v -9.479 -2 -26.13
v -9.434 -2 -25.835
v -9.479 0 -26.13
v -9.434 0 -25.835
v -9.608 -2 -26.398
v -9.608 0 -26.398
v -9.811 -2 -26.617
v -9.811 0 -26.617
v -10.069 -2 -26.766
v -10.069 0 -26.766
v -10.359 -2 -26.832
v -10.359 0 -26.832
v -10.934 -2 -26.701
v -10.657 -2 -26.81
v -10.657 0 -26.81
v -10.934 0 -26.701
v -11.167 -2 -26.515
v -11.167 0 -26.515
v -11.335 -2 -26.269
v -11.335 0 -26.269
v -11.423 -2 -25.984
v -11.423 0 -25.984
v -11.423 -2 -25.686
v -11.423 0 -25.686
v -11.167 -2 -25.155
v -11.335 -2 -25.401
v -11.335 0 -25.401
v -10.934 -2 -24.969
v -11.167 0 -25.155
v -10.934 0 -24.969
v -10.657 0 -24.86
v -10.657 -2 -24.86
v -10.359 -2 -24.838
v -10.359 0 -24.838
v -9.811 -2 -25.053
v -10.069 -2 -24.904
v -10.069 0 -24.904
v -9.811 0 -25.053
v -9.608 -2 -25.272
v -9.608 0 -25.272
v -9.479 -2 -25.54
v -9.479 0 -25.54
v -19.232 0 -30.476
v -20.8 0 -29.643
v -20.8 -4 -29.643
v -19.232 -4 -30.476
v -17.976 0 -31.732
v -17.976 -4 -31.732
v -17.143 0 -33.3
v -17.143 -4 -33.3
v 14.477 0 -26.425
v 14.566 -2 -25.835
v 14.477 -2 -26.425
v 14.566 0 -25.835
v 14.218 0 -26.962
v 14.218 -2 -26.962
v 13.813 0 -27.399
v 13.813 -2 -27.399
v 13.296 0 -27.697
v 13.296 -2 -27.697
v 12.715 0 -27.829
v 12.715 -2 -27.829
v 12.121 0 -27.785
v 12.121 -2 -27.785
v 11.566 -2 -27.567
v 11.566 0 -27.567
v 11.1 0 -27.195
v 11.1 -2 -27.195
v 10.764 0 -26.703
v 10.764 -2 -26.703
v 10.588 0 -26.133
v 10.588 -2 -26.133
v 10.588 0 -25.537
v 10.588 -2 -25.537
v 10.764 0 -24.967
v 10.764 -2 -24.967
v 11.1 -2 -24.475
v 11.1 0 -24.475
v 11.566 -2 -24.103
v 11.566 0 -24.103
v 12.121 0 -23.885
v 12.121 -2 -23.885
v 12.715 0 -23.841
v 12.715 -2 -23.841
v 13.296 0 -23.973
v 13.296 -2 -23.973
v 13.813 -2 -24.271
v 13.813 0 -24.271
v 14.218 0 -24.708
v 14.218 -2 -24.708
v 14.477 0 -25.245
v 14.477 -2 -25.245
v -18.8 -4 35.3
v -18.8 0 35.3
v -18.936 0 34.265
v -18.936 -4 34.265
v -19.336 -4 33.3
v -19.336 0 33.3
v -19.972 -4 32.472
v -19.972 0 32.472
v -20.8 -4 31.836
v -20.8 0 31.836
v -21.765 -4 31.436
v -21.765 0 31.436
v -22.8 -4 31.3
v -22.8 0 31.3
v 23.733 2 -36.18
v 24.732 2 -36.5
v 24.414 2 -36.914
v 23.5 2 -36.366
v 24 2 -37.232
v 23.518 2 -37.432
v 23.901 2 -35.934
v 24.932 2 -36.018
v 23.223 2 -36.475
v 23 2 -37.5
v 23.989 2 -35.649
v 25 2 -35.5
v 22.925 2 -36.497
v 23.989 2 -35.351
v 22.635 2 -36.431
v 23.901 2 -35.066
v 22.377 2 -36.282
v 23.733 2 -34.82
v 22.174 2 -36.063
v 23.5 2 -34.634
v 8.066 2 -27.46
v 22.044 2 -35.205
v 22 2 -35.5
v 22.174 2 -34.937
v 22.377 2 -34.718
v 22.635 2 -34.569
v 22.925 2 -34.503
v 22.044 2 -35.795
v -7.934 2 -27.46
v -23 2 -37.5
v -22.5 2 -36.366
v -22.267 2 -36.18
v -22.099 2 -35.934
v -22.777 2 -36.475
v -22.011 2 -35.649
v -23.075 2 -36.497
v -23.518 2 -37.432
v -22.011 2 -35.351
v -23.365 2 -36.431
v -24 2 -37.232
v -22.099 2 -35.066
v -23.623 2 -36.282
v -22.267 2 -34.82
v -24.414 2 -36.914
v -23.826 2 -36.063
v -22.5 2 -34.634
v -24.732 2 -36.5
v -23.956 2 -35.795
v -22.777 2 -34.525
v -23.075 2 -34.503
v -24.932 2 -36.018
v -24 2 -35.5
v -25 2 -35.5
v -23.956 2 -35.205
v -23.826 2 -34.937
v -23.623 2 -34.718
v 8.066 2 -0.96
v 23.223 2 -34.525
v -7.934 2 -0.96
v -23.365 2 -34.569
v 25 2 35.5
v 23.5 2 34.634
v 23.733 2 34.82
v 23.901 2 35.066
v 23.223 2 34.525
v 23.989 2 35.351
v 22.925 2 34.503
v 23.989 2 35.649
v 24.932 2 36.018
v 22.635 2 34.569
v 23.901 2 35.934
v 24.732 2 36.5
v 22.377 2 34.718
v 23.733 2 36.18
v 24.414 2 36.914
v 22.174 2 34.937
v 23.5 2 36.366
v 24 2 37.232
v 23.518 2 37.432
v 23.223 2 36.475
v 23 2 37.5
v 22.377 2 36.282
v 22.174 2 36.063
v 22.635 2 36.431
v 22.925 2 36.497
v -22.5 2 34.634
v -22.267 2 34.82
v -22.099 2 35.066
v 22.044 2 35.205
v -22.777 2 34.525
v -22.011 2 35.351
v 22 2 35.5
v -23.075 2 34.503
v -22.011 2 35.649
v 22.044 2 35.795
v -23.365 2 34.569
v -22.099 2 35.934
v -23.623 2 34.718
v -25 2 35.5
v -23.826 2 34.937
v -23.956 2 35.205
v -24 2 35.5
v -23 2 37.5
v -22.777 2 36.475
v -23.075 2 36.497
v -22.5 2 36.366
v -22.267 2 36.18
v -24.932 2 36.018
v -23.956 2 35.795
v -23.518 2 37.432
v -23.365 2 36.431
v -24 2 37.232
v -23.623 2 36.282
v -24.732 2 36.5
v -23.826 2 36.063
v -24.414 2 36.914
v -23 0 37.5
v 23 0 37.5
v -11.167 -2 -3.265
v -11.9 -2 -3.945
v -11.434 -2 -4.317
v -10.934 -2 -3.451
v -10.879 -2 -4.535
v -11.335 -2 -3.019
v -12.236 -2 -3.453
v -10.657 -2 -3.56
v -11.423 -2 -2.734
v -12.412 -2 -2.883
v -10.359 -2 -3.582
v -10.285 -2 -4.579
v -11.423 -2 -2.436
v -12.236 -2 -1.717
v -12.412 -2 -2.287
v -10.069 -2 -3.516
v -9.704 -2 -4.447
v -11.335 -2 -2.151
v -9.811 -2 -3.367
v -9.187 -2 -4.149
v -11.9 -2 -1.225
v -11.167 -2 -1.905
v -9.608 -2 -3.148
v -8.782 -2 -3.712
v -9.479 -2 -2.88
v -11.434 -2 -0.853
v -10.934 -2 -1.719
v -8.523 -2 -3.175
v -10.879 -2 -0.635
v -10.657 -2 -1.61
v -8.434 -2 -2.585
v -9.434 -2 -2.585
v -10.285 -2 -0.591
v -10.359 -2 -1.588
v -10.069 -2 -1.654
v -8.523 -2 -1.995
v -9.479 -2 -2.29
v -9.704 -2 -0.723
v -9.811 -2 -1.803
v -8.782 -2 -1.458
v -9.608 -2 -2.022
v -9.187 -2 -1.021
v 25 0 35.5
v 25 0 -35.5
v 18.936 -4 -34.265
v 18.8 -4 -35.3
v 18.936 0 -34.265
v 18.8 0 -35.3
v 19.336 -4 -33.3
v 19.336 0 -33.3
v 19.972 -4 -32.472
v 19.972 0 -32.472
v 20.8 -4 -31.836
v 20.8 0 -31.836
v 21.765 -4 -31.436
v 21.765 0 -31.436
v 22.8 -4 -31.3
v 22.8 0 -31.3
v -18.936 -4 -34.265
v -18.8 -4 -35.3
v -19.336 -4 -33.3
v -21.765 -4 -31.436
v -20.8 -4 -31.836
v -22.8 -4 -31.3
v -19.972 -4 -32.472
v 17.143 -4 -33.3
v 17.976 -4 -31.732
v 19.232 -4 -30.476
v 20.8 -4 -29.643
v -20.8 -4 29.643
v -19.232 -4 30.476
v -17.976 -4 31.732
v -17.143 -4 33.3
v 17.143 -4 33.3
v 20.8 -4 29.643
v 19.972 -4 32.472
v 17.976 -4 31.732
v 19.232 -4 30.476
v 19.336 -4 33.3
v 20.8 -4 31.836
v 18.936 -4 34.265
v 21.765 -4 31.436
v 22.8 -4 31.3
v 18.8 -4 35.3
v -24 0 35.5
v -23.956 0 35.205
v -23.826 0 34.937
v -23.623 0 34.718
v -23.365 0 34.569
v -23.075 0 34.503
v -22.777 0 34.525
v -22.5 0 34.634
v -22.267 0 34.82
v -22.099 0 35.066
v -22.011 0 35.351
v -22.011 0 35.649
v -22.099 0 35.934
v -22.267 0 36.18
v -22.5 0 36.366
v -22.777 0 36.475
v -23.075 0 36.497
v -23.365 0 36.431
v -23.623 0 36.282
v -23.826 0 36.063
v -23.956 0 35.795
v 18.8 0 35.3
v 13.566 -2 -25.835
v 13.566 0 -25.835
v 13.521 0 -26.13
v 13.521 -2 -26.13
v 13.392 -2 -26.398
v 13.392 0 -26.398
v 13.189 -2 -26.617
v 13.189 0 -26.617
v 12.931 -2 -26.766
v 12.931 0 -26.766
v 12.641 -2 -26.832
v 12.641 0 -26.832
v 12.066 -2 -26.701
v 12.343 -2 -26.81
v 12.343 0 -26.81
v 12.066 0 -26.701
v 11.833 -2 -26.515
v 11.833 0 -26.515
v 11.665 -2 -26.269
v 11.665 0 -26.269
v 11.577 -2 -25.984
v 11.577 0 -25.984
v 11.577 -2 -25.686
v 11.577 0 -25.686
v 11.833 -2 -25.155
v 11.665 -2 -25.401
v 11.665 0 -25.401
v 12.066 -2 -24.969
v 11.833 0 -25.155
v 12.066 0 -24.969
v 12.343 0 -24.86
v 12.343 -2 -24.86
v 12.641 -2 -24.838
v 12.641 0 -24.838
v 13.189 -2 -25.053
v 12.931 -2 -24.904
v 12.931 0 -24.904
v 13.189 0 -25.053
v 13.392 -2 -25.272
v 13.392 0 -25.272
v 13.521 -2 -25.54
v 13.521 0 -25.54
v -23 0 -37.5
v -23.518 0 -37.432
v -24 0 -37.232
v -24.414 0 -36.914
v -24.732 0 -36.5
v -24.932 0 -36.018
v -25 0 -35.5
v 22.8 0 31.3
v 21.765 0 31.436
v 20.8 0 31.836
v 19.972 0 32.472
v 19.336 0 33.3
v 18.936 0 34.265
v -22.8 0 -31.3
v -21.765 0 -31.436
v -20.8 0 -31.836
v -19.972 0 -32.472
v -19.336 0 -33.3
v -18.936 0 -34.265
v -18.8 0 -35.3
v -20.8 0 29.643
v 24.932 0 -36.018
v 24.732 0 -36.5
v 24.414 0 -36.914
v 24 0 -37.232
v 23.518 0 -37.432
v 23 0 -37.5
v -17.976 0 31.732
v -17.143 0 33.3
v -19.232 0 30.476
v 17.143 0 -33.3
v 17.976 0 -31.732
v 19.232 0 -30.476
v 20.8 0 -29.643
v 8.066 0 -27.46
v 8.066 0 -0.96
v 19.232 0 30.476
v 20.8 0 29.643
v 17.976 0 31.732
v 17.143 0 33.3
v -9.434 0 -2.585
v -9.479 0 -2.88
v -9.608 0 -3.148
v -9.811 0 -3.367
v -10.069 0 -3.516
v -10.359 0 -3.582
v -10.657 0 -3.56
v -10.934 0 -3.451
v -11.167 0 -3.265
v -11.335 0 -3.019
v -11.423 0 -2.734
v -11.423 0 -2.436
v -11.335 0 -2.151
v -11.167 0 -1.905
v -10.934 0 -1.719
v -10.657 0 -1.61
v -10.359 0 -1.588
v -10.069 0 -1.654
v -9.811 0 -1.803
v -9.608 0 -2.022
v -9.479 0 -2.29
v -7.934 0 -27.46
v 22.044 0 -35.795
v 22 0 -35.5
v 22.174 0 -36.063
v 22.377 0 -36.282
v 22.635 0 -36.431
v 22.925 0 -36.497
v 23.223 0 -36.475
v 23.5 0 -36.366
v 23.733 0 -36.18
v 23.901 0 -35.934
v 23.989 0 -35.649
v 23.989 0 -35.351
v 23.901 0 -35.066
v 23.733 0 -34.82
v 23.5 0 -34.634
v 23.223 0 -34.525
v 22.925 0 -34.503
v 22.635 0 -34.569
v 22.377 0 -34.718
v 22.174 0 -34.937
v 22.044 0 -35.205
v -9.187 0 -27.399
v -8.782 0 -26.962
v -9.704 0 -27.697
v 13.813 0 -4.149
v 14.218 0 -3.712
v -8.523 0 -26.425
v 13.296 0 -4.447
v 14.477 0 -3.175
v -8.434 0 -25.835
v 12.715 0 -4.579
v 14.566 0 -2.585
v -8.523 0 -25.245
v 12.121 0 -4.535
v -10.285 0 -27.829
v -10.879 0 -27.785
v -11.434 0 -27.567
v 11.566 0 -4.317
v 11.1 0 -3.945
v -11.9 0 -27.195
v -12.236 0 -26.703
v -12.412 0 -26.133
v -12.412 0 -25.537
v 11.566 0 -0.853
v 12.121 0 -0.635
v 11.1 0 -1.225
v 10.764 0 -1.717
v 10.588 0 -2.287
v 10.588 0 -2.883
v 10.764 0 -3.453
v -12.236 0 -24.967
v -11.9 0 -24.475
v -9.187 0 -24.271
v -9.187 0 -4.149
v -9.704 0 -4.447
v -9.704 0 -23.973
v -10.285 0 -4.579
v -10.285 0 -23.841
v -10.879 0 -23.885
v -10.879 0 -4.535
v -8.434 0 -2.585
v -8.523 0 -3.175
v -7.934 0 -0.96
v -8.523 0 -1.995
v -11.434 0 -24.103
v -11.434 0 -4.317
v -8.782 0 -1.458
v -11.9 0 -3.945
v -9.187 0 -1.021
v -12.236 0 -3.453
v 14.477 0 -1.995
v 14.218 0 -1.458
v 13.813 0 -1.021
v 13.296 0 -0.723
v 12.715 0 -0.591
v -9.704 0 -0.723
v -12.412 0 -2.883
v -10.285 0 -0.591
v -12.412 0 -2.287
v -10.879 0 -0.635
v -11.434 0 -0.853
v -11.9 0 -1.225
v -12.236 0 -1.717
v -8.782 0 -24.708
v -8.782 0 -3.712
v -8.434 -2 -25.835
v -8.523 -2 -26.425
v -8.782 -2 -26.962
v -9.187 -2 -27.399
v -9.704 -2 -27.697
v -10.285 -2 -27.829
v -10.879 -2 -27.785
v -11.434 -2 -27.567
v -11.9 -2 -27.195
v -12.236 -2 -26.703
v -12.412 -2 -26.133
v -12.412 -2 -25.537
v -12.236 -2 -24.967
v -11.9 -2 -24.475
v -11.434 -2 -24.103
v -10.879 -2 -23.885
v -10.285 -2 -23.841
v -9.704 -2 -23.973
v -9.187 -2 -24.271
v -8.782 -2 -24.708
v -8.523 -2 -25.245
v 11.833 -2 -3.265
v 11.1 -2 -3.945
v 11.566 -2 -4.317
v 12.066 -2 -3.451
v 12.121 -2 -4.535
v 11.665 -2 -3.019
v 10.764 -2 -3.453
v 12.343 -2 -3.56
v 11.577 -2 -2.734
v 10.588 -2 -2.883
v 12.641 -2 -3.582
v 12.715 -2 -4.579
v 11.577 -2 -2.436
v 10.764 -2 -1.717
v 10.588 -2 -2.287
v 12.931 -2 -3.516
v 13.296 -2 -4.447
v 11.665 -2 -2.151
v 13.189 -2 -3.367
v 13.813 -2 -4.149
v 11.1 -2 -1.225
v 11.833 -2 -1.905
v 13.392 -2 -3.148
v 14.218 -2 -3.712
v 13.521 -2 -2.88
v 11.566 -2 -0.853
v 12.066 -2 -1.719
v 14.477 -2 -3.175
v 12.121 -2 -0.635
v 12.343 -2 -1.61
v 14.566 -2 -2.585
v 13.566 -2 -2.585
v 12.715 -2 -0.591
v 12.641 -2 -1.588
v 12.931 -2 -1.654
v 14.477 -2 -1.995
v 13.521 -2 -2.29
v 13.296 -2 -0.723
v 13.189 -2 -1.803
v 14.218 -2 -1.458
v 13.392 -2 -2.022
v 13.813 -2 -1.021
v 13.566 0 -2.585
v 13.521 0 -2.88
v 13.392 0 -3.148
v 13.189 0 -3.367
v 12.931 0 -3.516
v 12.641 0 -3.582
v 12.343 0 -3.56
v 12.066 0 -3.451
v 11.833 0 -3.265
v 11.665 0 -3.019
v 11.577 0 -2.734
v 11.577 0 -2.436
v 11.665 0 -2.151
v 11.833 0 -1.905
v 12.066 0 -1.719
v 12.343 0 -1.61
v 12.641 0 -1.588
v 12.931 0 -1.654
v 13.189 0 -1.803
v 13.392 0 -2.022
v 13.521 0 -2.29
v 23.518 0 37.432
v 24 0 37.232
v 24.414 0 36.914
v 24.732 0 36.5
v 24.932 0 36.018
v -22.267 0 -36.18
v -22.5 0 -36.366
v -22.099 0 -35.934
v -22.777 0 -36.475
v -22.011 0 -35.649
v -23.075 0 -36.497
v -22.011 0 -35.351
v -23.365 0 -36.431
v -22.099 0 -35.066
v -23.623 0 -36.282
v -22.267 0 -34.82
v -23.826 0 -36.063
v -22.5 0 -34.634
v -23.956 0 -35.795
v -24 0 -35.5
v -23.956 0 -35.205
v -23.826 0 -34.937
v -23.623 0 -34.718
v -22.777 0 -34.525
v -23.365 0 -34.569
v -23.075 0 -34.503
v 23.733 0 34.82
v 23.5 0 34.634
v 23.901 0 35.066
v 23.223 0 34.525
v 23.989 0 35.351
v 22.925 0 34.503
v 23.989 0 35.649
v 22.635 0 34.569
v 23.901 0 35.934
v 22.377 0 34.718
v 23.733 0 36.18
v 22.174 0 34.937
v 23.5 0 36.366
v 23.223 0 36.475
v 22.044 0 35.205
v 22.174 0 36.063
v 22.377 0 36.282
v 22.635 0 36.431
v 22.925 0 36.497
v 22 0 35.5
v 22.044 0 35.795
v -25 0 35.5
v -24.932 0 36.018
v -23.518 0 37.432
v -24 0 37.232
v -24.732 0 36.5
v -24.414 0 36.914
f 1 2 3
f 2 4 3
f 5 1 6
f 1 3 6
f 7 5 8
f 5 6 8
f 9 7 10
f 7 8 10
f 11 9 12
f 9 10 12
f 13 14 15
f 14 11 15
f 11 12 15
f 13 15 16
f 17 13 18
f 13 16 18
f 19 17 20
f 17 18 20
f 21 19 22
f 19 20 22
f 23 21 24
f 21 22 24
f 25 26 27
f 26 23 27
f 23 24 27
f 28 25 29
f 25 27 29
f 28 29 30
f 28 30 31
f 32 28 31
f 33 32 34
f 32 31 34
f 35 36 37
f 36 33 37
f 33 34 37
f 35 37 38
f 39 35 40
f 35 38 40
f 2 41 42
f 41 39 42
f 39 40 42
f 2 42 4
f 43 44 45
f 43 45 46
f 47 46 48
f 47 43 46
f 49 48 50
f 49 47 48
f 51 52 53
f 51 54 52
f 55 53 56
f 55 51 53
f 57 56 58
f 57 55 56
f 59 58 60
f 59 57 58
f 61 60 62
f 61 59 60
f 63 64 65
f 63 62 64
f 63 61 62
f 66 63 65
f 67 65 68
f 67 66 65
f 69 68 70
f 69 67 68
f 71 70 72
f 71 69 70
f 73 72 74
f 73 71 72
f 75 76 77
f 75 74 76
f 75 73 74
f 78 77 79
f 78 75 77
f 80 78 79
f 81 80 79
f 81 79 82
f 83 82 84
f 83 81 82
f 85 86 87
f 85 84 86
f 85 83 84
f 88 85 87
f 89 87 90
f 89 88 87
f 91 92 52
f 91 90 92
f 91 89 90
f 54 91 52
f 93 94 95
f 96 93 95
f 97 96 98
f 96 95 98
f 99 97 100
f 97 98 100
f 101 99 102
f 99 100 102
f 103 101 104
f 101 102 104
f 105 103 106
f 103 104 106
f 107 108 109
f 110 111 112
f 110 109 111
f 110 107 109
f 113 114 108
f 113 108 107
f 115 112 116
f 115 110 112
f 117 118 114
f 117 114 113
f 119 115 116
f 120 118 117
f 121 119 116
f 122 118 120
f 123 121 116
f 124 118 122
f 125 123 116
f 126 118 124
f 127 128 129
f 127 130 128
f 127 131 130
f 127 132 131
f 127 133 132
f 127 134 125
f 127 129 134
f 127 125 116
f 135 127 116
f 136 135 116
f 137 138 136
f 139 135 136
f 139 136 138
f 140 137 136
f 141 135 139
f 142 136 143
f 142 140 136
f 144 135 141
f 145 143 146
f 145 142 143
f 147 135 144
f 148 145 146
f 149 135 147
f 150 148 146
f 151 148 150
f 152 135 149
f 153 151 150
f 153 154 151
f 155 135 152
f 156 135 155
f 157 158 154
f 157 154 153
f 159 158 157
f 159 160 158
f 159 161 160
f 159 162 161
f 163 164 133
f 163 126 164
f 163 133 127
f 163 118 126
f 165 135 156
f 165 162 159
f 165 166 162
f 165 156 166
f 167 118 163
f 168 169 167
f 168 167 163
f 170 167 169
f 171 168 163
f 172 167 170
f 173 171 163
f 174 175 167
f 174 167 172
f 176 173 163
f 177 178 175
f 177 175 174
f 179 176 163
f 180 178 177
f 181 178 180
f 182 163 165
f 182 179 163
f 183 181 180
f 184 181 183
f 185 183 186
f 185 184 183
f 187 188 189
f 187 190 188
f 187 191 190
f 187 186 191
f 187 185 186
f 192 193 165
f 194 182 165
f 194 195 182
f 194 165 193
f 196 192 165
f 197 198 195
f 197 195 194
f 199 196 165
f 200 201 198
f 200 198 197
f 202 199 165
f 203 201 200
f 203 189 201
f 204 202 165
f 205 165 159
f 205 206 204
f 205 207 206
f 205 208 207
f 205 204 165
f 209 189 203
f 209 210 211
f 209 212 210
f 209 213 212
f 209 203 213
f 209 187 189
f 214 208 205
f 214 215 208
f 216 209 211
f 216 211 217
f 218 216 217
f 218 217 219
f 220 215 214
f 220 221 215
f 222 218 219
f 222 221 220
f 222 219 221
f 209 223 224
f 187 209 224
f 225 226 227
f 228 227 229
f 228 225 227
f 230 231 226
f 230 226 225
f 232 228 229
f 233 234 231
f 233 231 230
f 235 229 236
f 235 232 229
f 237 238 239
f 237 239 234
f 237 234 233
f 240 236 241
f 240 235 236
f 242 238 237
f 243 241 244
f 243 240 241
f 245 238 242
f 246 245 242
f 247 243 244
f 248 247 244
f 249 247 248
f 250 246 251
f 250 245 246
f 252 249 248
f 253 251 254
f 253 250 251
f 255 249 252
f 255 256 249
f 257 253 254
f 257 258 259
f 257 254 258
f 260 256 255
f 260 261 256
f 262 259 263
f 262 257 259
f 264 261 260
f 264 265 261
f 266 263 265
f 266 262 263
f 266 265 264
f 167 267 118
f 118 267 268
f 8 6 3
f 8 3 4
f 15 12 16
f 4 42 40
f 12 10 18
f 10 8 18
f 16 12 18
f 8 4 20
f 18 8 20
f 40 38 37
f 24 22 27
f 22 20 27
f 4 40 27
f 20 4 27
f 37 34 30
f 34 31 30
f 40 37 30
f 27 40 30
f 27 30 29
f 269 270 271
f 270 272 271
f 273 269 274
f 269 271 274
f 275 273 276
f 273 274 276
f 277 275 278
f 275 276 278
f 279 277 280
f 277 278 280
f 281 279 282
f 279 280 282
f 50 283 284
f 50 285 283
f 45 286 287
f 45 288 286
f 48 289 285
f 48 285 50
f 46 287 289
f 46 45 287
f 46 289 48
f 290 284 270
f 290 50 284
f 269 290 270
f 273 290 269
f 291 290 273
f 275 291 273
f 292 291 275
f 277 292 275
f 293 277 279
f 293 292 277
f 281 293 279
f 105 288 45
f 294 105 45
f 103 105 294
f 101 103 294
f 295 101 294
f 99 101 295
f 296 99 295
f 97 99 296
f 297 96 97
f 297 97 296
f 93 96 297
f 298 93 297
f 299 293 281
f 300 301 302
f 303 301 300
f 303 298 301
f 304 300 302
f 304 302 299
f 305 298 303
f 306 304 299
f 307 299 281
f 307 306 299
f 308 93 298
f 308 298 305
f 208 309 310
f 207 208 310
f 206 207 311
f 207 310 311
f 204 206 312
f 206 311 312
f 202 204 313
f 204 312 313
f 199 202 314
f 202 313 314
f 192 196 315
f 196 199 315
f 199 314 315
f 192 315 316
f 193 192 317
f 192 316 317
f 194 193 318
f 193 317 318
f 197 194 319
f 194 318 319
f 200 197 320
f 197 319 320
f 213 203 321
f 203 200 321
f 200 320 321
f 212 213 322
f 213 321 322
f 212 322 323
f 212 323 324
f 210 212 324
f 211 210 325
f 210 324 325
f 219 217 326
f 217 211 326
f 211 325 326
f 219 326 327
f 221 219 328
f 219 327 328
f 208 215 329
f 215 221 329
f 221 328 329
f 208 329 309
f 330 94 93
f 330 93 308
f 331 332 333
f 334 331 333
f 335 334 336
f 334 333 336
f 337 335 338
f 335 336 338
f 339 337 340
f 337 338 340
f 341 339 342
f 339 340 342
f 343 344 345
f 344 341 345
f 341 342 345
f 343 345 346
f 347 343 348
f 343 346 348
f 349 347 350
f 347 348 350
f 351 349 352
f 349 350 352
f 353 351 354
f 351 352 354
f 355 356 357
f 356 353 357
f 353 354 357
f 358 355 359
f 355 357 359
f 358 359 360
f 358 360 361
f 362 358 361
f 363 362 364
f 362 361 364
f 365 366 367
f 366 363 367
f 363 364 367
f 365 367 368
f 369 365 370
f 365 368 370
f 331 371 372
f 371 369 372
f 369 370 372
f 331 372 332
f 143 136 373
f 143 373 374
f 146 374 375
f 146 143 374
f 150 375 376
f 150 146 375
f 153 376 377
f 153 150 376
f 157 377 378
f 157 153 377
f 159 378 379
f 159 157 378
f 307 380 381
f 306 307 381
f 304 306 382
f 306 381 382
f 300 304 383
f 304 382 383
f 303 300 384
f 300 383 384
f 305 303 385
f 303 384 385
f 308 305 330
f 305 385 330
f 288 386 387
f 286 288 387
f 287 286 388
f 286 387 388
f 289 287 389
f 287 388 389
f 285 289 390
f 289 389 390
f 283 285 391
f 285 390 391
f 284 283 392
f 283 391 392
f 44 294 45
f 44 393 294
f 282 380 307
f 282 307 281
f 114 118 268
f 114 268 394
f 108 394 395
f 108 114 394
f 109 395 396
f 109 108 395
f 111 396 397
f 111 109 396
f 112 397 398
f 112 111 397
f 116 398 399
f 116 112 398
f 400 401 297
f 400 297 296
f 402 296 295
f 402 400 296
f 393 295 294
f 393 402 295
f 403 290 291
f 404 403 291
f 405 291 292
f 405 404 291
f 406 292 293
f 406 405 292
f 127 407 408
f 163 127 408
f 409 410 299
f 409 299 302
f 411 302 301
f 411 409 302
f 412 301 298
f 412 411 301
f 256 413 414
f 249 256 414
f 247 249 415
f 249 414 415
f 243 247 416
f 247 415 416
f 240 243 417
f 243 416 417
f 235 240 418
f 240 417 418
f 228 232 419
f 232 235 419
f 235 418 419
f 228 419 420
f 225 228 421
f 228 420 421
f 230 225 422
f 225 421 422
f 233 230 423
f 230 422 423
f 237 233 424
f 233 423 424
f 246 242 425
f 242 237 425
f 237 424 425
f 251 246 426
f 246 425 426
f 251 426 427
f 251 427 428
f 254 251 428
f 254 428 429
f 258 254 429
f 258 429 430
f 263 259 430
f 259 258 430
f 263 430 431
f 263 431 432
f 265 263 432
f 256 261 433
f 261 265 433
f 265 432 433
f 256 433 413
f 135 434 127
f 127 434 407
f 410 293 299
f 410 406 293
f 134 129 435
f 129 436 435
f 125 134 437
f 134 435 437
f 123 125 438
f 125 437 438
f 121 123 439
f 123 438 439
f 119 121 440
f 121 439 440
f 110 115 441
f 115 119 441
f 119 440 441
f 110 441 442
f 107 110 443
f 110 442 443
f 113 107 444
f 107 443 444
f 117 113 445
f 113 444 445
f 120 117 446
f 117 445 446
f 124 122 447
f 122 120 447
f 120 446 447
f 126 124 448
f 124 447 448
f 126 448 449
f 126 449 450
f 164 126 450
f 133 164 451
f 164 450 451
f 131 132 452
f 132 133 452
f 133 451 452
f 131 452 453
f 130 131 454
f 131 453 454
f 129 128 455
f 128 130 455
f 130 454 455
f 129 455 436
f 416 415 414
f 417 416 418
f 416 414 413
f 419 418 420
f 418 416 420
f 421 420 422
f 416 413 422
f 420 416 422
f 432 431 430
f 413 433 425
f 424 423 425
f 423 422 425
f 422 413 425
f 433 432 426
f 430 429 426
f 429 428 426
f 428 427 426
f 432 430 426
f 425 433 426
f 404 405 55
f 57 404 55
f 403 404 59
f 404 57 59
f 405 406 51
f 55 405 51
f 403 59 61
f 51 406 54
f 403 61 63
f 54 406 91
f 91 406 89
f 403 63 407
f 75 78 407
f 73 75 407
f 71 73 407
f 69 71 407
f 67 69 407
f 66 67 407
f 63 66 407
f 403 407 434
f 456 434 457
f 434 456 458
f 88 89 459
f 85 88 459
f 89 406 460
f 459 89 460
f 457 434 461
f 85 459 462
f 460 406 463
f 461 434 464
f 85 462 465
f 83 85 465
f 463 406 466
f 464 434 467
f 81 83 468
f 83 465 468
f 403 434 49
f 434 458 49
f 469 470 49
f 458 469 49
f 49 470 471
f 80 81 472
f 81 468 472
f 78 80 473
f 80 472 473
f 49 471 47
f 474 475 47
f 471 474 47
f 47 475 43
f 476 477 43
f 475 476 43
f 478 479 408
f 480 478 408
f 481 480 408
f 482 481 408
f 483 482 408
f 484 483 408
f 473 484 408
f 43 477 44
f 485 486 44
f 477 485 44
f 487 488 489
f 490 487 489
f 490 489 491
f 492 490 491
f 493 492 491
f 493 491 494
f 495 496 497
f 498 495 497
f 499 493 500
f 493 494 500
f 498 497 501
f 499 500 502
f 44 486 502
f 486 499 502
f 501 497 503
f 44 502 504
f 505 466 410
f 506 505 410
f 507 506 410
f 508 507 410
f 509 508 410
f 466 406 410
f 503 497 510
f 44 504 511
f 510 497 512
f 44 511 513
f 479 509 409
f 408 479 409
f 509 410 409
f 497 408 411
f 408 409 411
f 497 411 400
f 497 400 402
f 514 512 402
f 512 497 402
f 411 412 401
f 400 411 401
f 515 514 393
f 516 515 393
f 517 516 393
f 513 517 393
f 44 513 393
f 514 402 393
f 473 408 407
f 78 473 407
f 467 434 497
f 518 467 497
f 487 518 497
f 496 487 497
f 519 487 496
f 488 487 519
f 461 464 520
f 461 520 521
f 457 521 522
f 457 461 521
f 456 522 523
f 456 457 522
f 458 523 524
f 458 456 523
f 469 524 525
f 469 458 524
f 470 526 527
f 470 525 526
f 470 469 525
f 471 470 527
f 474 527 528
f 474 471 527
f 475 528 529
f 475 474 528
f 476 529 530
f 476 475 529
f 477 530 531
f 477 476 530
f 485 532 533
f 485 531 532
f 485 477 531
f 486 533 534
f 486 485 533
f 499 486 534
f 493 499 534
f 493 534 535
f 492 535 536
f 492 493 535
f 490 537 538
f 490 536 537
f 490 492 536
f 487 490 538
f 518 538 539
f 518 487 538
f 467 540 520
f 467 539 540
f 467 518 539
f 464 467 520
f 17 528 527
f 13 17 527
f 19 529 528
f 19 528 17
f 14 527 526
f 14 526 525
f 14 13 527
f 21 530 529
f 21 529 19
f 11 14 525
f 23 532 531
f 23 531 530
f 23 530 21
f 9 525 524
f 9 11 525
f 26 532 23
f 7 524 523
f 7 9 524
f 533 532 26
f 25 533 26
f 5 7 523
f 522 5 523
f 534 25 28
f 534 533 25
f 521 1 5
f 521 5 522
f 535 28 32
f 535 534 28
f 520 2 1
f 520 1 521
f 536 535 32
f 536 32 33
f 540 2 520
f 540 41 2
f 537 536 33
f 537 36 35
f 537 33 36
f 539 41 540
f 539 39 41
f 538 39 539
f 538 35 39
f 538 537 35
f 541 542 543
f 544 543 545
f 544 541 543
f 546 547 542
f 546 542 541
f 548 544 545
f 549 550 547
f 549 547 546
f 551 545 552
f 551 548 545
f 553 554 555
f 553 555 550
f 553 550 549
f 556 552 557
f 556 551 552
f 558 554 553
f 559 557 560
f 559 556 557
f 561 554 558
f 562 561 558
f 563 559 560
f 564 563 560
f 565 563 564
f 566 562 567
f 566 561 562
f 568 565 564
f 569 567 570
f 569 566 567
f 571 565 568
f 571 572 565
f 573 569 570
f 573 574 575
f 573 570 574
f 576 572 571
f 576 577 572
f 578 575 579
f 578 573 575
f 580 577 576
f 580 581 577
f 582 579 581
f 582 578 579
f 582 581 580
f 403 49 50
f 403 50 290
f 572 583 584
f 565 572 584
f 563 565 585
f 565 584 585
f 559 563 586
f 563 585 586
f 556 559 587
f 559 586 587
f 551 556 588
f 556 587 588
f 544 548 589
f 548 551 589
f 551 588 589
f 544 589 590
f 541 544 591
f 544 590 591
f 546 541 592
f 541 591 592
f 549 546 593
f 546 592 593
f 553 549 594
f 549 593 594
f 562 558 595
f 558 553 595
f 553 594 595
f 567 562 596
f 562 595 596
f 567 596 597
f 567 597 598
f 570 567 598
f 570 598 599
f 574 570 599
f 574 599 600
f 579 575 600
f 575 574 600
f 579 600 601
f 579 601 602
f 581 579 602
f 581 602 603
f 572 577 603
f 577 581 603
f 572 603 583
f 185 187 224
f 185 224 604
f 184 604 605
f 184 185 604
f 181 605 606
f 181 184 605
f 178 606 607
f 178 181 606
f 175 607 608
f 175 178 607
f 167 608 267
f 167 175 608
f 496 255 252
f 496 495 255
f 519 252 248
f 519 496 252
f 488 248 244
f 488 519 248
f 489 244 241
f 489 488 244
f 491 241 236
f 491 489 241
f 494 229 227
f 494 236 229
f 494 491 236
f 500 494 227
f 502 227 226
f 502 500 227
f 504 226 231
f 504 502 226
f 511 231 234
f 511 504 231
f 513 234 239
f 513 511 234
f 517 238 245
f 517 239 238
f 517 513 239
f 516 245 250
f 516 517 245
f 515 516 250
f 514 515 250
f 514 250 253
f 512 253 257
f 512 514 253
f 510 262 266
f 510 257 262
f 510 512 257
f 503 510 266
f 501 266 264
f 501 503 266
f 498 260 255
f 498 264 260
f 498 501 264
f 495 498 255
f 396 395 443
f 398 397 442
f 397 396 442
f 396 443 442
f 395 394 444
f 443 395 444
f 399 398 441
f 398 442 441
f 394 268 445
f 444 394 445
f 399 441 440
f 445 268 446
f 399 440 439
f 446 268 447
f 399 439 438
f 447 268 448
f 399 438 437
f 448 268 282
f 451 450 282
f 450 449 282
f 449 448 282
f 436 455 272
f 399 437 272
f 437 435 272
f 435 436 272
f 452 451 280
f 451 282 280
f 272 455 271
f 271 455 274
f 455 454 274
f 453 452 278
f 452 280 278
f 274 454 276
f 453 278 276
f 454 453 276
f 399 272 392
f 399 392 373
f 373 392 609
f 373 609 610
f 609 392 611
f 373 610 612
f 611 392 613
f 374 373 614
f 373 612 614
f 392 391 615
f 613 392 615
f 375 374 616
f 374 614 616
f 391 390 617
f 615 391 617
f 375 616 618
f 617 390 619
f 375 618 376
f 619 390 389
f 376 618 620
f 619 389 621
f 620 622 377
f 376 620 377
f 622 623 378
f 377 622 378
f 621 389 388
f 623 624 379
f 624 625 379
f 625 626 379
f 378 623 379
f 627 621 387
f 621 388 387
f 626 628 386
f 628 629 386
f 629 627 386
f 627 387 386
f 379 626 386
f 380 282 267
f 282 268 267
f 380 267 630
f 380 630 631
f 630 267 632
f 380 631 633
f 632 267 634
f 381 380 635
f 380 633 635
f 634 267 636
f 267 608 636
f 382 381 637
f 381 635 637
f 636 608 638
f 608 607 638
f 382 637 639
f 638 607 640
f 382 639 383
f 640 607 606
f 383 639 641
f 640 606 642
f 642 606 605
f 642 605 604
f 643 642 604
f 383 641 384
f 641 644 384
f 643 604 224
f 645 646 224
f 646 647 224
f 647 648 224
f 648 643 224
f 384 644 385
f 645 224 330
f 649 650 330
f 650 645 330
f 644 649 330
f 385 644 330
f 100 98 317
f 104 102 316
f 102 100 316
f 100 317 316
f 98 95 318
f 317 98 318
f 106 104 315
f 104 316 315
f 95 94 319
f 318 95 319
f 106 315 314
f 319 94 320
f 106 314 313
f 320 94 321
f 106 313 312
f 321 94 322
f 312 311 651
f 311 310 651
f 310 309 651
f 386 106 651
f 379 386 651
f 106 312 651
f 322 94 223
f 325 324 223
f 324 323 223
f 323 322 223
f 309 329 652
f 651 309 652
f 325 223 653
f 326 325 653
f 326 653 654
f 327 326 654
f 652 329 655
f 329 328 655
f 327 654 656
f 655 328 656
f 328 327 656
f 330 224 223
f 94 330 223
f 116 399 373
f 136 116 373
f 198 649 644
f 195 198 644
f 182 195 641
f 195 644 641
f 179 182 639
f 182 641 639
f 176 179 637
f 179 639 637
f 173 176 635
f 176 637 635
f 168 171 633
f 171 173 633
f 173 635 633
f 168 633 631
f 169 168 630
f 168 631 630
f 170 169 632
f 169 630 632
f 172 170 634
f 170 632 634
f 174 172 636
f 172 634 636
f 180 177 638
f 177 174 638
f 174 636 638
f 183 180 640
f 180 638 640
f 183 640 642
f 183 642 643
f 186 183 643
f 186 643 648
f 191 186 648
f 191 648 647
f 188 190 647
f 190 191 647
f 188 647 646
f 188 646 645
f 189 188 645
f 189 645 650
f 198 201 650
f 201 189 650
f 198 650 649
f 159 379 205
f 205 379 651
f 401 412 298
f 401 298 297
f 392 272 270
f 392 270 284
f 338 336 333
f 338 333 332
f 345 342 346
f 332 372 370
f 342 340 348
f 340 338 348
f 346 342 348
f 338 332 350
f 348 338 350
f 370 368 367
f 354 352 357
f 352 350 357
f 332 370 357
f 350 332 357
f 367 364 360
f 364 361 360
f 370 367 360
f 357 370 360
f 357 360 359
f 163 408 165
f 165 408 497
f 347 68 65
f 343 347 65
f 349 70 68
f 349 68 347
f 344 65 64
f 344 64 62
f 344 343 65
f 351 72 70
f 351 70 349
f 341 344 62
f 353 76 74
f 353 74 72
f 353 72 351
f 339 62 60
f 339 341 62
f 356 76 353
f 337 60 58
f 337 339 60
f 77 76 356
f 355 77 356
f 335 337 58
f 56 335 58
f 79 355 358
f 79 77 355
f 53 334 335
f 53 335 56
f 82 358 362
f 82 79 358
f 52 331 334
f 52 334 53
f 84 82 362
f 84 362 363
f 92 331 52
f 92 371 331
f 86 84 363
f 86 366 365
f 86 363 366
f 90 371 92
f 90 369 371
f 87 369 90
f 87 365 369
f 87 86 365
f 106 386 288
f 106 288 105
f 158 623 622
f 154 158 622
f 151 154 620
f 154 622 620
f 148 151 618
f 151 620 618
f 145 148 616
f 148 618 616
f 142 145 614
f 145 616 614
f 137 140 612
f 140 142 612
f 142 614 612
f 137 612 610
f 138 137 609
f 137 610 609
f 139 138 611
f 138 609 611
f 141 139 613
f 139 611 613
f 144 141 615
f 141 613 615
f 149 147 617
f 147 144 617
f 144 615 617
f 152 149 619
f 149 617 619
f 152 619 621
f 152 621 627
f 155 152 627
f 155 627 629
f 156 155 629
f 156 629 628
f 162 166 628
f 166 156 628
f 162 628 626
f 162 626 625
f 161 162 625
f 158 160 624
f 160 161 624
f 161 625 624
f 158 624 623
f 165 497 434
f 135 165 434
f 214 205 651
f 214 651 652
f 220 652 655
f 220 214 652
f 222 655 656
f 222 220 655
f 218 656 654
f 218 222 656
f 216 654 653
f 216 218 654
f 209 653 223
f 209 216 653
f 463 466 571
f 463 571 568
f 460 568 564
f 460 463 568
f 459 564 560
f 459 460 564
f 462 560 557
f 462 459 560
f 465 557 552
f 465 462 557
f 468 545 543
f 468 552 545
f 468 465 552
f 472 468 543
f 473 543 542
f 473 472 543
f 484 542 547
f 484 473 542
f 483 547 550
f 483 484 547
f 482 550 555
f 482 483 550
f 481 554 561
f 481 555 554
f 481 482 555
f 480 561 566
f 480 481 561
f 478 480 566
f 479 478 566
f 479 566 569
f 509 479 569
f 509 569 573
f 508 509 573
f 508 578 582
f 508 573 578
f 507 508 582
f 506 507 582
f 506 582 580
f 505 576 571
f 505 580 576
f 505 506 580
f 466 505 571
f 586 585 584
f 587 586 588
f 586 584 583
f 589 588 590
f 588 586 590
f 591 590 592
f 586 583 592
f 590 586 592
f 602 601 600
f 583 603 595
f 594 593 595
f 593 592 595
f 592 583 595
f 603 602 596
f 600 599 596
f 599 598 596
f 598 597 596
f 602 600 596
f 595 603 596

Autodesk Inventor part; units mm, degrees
ref_plane "YZ Plane" through (0, 0, 0) normal (1, 0, 0) x (0, 1, 0)
ref_plane "XZ Plane" through (0, 0, 0) normal (0, 1, 0) x (-1, 0, 0)
ref_plane "XY Plane" through (0, 0, 0) normal (0, 0, 1) x (1, 0, 0)
sketch "Sketch1" plane through (0, 0, 0) normal (0, 1, 0) x (-1, 0, 0)
  line L0 (25, 37.5) -> (-25, 37.5)
  line L1 (-25, 37.5) -> (-25, -37.5)
  line L2 (-25, -37.5) -> (25, -37.5)
  line L3 (25, -37.5) -> (25, 37.5)
  line L4 (-25, 37.5) -> (25, -37.5) construction
  circle A0 centre (23, -35.5) radius 1
  circle A1 centre (-23, -35.5) radius 1
  circle A2 centre (-23, 35.5) radius 1
  circle A3 centre (23, 35.5) radius 1
  point P0 (0, 0)
  point P1 (0, 0)
  dimension "d0" = 75
  dimension "d1" = 50
  dimension "d17" = 2
  dimension "d18" = 2
  dimension "d21" = 2
  dimension "d22" = 2
  dimension "d23" = 2
  dimension "d25" = 2
  dimension "d26" = 2
  dimension "d27" = 2
  dimension "d28" = 2
extrude "Extrusion1" add sketch "Sketch1" along normal blind 2
sketch "Sketch4" plane through (0, 0, 0) normal (0, -1, 0) x (1, 0, 0)
  line L0 (-18.8, 35.3) -> (18.8, 35.3)
  line L1 (22.8, 31.3) -> (22.8, -31.3)
  line L2 (18.8, -35.3) -> (-18.8, -35.3)
  line L3 (-22.8, -31.3) -> (-22.8, 31.3)
  line L4 (-22.8, 35.3) -> (22.8, -35.3) construction
  line L5 (-25, -37.5) -> (-25, 37.5) projected
  line L6 (-25, 37.5) -> (25, 37.5) projected
  arc A0 (-22.8, 31.3) -> (-18.8, 35.3) centre (-22.8, 35.3) ccw
  arc A1 (18.8, 35.3) -> (22.8, 31.3) centre (22.8, 35.3) ccw
  arc A2 (-18.8, -35.3) -> (-22.8, -31.3) centre (-22.8, -35.3) ccw
  arc A3 (22.8, -31.3) -> (18.8, -35.3) centre (22.8, -35.3) ccw
  line L7 (17.1431, 33.3) -> (-17.1431, 33.3)
  arc A4 (-20.8, 29.6431) -> (-17.1431, 33.3) centre (-22.8, 35.3) ccw
  line L8 (-20.8, 29.6431) -> (-20.8, -29.6431)
  arc A5 (-17.1431, -33.3) -> (-20.8, -29.6431) centre (-22.8, -35.3) ccw
  line L9 (-17.1431, -33.3) -> (17.1431, -33.3)
  arc A6 (20.8, -29.6431) -> (17.1431, -33.3) centre (22.8, -35.3) ccw
  line L10 (20.8, -29.6431) -> (20.8, 29.6431)
  arc A7 (17.1431, 33.3) -> (20.8, 29.6431) centre (22.8, 35.3) ccw
  point P0 (0, 0)
  point P1 (0, 0)
  dimension "d29" = 2.2
  dimension "d30" = 2.2
  dimension "d32" = 4
  dimension "d35" = 2
extrude "Extrusion4" add sketch "Sketch4" along normal blind 4
sketch "Sketch5" plane through (0, 0, 0) normal (0, -1, 0) x (1, 0, 0)
  line L0 (-10.4342, -25.835) -> (12.5658, -25.835) construction
  line L1 (12.5658, -25.835) -> (12.5658, -2.585) construction
  line L2 (12.5658, -2.585) -> (-10.4342, -2.585) construction
  line L3 (-10.4342, -2.585) -> (-10.4342, -25.835) construction
  line L4 (-10.4342, -2.585) -> (12.5658, -25.835) construction
  circle A0 centre (-10.4342, -2.585) radius 1
  circle A1 centre (-10.4342, -25.835) radius 1
  circle A2 centre (12.5658, -25.835) radius 1
  circle A3 centre (12.5658, -2.585) radius 1
  circle A4 centre (-10.4342, -25.835) radius 2
  circle A5 centre (-10.4342, -2.585) radius 2
  circle A6 centre (12.5658, -2.585) radius 2
  circle A7 centre (12.5658, -25.835) radius 2
  line L5 (-10.4342, -14.21) -> (12.5658, -14.21) construction
  point P0 (0, 0)
  dimension "d36" = 23.25
  dimension "d37" = 23
  dimension "d38" = 2
  dimension "d39" = 4
extrude "Extrusion5" add sketch "Sketch5" along normal blind 2
sketch "Sketch6" plane through (0, 0, 0) normal (0, -1, 0) x (1, 0, 0)
  line L0 (-7.9342, -27.46) -> (8.0658, -27.46)
  line L1 (8.0658, -27.46) -> (8.0658, -0.96)
  line L2 (8.0658, -0.96) -> (-7.9342, -0.96)
  line L3 (-7.9342, -0.96) -> (-7.9342, -27.46)
  circle A0 centre (-10.4342, -25.835) radius 1 projected
  line L4 (-10.58, -24.8457) -> (-10.58, -3.5743) construction
  circle A1 centre (-10.4342, -2.585) radius 1 projected
  line L5 (-10.58, -14.21) -> (-1.6995, -14.21) construction
  point P0 (0, 0)
  dimension "d42" = 16
  dimension "d43" = 26.5
  dimension "d45" = 1.5
extrude "Extrusion6" cut sketch "Sketch6" against normal blind 10 contours L3 L2 L1 L0
fillet "Fillet2" radius 2 4 edges at (-25, 1, 37.5) (-25, 1, -37.5) (25, 1, -37.5) (25, 1, 37.5)
equation "\"d18\" = d17"
equation "\"d22\" = d17"
equation "\"d23\" = d17"
equation "\"d25\" = d17"
equation "\"d26\" = d17"
equation "\"d27\" = d17"
equation "\"d28\" = d17"
equation "\"d30\" = d29"
properties part number "Enclosure Lid"
